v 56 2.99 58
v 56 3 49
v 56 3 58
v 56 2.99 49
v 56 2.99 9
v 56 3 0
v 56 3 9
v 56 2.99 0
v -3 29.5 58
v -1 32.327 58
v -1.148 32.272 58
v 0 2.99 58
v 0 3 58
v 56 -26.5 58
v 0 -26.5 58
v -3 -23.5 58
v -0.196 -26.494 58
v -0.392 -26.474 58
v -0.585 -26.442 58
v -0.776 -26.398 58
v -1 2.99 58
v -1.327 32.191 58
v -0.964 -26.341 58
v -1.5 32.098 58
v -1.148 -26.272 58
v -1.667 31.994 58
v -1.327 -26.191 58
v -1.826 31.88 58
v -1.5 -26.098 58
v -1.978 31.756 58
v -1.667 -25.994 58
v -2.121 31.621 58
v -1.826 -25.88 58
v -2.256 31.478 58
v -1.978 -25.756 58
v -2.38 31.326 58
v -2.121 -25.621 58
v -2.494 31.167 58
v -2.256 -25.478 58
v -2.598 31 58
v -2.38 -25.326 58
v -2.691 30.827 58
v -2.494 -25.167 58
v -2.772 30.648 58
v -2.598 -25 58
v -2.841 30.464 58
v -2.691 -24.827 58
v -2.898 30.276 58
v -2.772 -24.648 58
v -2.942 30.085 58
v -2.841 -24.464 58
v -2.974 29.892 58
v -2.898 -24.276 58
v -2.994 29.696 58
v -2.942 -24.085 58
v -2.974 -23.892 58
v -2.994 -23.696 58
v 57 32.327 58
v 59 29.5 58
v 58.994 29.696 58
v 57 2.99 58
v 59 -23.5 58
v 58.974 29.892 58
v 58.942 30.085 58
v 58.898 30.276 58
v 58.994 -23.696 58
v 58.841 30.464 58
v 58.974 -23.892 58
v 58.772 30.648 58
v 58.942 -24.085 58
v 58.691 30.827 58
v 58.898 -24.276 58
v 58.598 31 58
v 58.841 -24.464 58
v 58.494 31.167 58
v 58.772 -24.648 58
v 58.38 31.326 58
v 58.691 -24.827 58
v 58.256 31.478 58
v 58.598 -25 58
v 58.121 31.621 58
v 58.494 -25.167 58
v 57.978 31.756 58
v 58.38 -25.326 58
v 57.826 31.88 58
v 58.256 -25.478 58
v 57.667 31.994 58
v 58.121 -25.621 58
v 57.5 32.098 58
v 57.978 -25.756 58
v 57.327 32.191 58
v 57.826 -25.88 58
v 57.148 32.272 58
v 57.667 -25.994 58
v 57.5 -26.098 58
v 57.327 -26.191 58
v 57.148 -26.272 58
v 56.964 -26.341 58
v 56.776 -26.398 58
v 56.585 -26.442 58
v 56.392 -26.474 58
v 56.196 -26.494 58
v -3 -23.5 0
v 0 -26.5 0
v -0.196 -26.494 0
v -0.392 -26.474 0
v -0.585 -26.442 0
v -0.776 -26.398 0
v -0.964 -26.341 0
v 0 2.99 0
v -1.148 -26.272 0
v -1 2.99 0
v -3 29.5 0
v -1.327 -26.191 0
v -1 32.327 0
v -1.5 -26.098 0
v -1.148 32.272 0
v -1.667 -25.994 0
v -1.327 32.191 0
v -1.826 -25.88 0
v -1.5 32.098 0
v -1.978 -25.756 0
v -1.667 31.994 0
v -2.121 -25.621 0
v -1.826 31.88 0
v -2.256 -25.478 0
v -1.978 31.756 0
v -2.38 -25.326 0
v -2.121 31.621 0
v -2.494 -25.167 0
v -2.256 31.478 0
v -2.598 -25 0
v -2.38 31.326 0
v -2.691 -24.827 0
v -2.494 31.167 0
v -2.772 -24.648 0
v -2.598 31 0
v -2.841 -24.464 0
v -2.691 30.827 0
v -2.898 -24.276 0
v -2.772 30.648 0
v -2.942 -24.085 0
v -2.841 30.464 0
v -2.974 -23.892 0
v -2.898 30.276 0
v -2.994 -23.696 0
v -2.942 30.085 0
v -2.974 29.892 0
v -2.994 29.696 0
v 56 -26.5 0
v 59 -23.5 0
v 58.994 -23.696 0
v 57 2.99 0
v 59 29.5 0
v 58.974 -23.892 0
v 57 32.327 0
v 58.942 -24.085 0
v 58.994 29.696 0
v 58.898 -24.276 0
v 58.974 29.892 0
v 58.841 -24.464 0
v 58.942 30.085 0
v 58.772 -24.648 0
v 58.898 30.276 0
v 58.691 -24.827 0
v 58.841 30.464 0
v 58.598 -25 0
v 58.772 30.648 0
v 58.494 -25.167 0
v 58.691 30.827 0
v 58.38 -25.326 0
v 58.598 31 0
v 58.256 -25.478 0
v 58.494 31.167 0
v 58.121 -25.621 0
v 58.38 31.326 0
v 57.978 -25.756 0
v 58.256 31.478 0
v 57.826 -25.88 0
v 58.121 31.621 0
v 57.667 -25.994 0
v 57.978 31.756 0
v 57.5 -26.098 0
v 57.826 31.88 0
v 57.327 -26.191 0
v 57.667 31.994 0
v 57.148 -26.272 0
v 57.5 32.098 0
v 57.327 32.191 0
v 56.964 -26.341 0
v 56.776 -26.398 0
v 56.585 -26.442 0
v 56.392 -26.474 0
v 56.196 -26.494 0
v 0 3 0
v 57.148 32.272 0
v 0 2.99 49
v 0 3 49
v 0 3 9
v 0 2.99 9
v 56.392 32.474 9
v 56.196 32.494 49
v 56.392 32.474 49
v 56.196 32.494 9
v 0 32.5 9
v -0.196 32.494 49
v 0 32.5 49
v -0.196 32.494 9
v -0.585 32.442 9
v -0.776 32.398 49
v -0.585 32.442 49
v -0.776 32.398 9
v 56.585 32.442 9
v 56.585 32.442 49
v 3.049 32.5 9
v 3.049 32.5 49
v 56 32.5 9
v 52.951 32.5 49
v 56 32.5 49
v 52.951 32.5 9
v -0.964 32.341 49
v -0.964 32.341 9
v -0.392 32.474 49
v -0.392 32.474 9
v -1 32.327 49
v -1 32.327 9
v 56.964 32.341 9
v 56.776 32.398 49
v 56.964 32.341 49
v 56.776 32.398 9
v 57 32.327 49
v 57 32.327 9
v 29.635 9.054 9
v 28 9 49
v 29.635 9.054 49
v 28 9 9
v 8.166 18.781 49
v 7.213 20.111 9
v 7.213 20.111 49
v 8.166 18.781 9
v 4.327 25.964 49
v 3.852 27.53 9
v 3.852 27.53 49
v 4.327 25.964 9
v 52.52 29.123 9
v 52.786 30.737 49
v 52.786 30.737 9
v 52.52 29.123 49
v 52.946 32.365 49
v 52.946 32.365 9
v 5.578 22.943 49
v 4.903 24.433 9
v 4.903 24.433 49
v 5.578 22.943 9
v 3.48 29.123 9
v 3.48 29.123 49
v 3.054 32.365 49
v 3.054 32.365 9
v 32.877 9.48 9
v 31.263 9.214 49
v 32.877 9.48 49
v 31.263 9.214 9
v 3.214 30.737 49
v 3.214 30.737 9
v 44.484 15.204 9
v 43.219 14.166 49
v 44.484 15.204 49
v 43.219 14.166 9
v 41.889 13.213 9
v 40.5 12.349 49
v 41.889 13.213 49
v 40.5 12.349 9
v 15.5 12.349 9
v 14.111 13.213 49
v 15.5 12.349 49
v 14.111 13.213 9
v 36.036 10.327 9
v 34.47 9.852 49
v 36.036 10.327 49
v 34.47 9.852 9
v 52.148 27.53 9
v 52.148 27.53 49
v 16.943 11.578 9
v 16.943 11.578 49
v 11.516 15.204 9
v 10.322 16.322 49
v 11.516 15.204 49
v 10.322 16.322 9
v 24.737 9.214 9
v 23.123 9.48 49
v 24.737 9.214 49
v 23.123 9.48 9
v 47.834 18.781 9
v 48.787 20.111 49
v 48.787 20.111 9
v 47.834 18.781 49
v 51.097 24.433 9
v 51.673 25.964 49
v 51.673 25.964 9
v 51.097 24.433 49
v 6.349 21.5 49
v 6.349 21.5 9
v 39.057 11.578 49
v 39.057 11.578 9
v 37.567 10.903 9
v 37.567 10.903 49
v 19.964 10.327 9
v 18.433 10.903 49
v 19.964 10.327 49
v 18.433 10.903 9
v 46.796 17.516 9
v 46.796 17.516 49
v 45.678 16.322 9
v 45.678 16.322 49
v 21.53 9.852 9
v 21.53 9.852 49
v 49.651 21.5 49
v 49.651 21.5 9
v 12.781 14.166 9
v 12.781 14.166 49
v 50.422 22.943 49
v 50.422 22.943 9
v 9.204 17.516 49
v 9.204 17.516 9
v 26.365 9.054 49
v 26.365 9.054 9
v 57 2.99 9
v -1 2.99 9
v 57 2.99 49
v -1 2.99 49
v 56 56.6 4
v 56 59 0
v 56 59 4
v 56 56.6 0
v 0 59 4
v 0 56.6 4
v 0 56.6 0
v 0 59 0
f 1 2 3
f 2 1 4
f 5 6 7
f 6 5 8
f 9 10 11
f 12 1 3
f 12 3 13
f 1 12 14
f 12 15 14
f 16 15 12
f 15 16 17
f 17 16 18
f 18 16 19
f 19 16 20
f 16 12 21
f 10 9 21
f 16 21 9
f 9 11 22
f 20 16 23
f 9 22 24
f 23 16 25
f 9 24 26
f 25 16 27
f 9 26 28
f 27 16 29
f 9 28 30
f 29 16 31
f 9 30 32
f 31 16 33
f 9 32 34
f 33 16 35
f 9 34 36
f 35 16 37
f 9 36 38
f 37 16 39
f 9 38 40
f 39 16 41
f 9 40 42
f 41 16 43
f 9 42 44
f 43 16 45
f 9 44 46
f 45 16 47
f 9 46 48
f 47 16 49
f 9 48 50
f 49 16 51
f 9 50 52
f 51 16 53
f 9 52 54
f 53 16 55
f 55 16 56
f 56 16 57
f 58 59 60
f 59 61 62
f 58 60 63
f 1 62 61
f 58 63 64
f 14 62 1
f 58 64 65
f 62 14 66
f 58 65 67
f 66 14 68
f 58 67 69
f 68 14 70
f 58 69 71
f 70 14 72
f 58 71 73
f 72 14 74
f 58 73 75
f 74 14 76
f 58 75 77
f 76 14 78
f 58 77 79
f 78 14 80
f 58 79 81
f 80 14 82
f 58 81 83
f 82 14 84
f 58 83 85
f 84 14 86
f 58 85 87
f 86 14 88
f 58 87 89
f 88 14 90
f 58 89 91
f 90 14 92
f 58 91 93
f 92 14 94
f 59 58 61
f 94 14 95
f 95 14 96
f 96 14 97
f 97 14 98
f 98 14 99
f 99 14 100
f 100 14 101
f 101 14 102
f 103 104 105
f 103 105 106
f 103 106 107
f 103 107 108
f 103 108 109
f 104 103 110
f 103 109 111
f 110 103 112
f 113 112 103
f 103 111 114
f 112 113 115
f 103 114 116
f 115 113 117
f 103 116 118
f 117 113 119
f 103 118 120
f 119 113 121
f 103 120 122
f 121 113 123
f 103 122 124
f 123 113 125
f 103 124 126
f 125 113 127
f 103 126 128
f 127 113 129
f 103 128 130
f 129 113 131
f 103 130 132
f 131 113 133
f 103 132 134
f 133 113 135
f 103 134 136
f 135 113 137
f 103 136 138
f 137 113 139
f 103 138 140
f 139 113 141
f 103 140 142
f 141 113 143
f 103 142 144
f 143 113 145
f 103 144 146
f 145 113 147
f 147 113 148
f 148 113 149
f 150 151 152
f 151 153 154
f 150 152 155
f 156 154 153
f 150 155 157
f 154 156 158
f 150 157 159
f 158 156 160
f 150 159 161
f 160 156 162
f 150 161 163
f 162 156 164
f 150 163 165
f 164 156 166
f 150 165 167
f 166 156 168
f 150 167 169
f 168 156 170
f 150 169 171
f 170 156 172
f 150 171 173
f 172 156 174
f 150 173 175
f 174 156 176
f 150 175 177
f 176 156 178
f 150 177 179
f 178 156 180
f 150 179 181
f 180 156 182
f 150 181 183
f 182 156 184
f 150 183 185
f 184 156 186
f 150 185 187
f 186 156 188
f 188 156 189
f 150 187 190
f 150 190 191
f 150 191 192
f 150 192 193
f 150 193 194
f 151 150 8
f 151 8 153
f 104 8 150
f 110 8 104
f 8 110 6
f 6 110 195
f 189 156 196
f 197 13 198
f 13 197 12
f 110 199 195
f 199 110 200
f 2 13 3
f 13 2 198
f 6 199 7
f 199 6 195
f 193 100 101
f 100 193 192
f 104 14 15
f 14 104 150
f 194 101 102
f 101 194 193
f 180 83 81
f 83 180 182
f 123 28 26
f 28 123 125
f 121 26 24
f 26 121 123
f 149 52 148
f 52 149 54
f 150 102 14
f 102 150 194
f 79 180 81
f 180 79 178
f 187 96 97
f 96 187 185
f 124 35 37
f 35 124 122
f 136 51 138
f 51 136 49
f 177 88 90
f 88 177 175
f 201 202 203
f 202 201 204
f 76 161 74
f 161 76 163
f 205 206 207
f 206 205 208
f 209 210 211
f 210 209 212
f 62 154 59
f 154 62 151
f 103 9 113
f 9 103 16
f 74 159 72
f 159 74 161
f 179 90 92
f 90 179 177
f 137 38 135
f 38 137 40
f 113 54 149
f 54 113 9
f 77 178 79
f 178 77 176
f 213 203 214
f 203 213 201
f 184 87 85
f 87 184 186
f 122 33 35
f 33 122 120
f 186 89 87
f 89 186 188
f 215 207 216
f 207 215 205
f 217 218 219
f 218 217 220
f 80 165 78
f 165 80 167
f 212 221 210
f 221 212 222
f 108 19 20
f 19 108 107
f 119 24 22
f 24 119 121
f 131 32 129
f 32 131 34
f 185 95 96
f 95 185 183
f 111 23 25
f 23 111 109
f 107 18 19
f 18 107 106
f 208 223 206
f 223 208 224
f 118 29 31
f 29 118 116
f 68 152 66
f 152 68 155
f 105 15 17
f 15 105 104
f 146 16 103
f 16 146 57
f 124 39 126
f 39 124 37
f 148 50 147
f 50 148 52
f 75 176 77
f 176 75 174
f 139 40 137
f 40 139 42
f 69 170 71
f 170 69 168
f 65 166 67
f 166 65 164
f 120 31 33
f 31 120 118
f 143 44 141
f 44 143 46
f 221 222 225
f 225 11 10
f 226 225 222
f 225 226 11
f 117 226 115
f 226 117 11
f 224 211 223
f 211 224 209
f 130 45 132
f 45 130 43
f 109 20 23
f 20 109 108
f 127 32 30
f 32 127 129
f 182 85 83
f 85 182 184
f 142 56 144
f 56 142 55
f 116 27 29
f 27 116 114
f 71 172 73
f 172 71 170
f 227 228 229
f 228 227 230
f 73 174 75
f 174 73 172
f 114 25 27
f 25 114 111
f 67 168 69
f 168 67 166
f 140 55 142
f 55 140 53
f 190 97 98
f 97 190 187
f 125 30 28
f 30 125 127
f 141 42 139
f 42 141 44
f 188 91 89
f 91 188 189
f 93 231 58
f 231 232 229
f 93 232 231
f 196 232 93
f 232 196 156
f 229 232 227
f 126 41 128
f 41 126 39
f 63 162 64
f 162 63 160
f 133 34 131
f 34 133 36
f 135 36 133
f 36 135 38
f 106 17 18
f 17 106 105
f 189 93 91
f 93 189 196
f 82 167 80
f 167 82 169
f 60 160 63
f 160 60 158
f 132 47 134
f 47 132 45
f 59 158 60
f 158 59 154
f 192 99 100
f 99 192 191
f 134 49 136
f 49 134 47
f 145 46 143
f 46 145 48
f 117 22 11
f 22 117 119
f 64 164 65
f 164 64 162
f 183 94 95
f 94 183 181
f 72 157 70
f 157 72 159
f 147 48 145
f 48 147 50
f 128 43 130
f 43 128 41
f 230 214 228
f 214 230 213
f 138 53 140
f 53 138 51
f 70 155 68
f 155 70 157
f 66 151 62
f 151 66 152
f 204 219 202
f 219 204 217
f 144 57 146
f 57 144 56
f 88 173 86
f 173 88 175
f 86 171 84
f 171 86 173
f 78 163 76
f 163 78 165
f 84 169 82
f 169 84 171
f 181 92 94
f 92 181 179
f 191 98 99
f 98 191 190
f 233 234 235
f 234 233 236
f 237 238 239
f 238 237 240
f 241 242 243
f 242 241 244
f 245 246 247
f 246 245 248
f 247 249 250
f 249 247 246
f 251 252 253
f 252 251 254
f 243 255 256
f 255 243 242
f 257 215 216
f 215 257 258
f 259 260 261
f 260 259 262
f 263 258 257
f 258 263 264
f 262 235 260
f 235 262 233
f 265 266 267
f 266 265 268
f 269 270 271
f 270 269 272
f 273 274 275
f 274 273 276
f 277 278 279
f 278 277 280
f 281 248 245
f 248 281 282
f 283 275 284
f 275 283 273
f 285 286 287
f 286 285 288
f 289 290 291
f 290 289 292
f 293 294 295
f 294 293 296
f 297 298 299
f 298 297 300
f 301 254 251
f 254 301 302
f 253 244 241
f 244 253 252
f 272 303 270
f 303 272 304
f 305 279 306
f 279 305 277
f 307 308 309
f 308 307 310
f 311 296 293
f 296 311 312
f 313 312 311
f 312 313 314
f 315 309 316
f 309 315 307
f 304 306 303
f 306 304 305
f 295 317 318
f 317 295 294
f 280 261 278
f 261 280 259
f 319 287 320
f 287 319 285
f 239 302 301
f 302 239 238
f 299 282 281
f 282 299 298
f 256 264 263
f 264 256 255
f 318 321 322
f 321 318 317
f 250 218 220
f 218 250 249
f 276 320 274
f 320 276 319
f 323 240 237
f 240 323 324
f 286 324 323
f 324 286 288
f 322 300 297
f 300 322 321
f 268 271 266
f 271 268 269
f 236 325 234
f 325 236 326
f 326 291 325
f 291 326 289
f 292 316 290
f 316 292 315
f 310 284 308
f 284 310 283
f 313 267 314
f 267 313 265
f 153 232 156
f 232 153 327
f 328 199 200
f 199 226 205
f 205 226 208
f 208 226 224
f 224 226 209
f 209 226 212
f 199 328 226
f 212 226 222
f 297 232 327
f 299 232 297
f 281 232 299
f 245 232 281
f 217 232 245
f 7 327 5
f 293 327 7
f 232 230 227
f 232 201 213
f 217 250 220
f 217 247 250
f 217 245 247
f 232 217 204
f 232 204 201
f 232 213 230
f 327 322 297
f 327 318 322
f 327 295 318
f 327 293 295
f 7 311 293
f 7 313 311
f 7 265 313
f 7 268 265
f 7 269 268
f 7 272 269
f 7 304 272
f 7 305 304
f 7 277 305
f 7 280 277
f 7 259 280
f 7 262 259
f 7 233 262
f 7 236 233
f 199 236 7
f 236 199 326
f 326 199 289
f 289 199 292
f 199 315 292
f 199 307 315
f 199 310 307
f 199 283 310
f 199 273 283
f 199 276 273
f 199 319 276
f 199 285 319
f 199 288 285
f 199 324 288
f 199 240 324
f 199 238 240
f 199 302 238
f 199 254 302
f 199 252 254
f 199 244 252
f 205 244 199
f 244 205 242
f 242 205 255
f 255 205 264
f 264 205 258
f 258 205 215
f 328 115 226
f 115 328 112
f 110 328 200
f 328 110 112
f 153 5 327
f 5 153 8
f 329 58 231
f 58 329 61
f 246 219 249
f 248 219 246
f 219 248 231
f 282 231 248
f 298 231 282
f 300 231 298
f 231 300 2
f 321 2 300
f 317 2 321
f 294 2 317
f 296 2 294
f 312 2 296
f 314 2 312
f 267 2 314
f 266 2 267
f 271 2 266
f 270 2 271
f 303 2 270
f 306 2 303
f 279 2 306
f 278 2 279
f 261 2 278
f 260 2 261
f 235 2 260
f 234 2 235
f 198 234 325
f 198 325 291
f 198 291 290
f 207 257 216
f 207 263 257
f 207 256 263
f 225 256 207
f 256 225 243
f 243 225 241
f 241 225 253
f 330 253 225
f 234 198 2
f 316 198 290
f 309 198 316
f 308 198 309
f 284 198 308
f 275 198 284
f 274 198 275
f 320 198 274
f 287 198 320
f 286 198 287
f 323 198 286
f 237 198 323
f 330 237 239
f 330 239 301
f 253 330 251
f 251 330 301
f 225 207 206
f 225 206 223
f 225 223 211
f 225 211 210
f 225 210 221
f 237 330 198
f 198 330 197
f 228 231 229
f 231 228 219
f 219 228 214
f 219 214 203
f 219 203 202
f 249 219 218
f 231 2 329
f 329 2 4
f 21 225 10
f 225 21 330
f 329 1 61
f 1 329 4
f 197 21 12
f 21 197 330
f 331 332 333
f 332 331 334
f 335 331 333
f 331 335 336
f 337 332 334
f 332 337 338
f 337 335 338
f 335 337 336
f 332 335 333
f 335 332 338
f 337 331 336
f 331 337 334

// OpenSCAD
// Hamster Bottle Magnetic Holder (parametric)
// Units: millimeters
// Author: ChatGPT

// ---------------- Parameters ----------------
holder_h      = 58;     // total height (matches image: 58 mm)
back_w        = 56;     // backplate width
shelf_d       = 56;     // overall depth from wall to front edge
wall_t        = 3;      // main wall thickness
cradle_ID     = 50;     // inner diameter of cradle (image shows 5 cm)
front_lip_h   = 4;      // small lip at bottom front to stop sliding out
front_lip_t   = 2.4;    // lip thickness
notch_w       = 16;     // V-notch approximate width for spout
notch_depth   = 10;     // V-notch depth into cradle

// Magnet pockets (2 x 2 grid)
mag_d         = 12;     // magnet diameter (change to your magnets: 10–15)
mag_t         = 2.5;    // magnet thickness (pocket depth)
mag_rows      = 2;
mag_cols      = 2;
mag_margin    = 9;      // margin from edges
mag_spacing_x = 20;     // center-to-center X spacing
mag_spacing_y = 20;     // center-to-center Y spacing

// Fillets / rounding (visual only; printed via chamfers)
edge_rad      = 3;

$fn = 96; // smoothness

module backplate() {
    difference() {
        // backplate body
        cube([back_w, wall_t, holder_h], center=false);
        // magnet pockets
        for (i=[0:mag_cols-1], j=[0:mag_rows-1]) {
            x = mag_margin + i*mag_spacing_x;
            y = wall_t/2;
            z = mag_margin + j*mag_spacing_y;
            translate([x, -0.01, z])
                rotate([90,0,0])
                    cylinder(d=mag_d, h=mag_t+0.02);
        }
    }
}

module cradle() {
    outer_R = cradle_ID/2 + wall_t;
    inner_R = cradle_ID/2;
    ch = holder_h;
    d = shelf_d - wall_t;

    difference() {
        // outer rectangular prism
        translate([back_w/2, wall_t, 0])
            linear_extrude(ch)
                offset(r=edge_rad)
                    square([outer_R*2, d], center=true);

        // inner cavity
        translate([back_w/2, wall_t + wall_t, 0])
            linear_extrude(ch + 0.1)
                translate([0, inner_R + wall_t])
                    circle(r=inner_R);

        // V-notch at front
        translate([back_w/2, shelf_d + wall_t - 0.01, holder_h/2])
            rotate([90,0,0])
                linear_extrude(height=wall_t+0.02)
                    polygon(points=[
                        [-notch_w/2,0],
                        [0, -notch_depth],
                        [notch_w/2,0]
                    ]);

        // Cut away top/bottom to leave a band
        band_clear = 10;
        translate([-1, wall_t-0.01, -1])
            cube([back_w+2, shelf_d+2, band_clear]);
        translate([-1, wall_t-0.01, holder_h - band_clear +1])
            cube([back_w+2, shelf_d+2, band_clear]);
    }
}

module front_lip() {
    translate([back_w/2 - (cradle_ID/2 + wall_t), shelf_d - front_lip_t + wall_t, 0])
        cube([cradle_ID + 2*wall_t, front_lip_t, front_lip_h]);
}

module holder() {
    union() {
        backplate();
        cradle();
        front_lip();
    }
}

holder();

// ---------------- Print notes ----------------
// Orientation: lay the backplate flat on build plate (magnets facing up).
// Suggested settings (Bambu A1):
//  - Nozzle: 0.4 mm, Layer height: 0.20 mm
//  - Perimeters: 4, Top/Bottom: 5 layers
//  - Infill: 20–30% Grid or Gyroid
//  - Material: PETG recommended
//  - Brim: 3–5 mm for adhesion
//  - Pause mid-print to insert magnets, or glue after
